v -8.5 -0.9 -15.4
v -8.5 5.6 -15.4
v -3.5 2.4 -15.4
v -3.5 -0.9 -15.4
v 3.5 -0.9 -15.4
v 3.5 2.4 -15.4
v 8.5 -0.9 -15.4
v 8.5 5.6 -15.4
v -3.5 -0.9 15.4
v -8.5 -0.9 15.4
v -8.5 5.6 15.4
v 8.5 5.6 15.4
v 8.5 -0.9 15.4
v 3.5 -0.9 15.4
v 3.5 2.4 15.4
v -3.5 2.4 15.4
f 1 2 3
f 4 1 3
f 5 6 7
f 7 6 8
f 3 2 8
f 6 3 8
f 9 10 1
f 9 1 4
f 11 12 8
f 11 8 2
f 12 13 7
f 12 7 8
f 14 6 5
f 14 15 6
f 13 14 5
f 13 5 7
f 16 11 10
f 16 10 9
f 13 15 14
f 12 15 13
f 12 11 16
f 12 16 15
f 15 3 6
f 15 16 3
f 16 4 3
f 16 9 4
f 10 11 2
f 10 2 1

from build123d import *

# Parameters (mm, degrees)
BOSS_EXTRUDE1_DEPTH = 15.4


with BuildPart() as part:
    # Sketch1 → Boss-Extrude1 (new, symmetric)
    with BuildSketch(Plane.XY):
        Polygon((3.5, 2.4), (3.5, -0.9), (8.5, -0.9), (8.5, 5.6), (-8.5, 5.6), (-8.5, -0.9), (-3.5, -0.9), (-3.5, 2.4), align=None)
    extrude(amount=BOSS_EXTRUDE1_DEPTH, both=True)


solid = part.part
